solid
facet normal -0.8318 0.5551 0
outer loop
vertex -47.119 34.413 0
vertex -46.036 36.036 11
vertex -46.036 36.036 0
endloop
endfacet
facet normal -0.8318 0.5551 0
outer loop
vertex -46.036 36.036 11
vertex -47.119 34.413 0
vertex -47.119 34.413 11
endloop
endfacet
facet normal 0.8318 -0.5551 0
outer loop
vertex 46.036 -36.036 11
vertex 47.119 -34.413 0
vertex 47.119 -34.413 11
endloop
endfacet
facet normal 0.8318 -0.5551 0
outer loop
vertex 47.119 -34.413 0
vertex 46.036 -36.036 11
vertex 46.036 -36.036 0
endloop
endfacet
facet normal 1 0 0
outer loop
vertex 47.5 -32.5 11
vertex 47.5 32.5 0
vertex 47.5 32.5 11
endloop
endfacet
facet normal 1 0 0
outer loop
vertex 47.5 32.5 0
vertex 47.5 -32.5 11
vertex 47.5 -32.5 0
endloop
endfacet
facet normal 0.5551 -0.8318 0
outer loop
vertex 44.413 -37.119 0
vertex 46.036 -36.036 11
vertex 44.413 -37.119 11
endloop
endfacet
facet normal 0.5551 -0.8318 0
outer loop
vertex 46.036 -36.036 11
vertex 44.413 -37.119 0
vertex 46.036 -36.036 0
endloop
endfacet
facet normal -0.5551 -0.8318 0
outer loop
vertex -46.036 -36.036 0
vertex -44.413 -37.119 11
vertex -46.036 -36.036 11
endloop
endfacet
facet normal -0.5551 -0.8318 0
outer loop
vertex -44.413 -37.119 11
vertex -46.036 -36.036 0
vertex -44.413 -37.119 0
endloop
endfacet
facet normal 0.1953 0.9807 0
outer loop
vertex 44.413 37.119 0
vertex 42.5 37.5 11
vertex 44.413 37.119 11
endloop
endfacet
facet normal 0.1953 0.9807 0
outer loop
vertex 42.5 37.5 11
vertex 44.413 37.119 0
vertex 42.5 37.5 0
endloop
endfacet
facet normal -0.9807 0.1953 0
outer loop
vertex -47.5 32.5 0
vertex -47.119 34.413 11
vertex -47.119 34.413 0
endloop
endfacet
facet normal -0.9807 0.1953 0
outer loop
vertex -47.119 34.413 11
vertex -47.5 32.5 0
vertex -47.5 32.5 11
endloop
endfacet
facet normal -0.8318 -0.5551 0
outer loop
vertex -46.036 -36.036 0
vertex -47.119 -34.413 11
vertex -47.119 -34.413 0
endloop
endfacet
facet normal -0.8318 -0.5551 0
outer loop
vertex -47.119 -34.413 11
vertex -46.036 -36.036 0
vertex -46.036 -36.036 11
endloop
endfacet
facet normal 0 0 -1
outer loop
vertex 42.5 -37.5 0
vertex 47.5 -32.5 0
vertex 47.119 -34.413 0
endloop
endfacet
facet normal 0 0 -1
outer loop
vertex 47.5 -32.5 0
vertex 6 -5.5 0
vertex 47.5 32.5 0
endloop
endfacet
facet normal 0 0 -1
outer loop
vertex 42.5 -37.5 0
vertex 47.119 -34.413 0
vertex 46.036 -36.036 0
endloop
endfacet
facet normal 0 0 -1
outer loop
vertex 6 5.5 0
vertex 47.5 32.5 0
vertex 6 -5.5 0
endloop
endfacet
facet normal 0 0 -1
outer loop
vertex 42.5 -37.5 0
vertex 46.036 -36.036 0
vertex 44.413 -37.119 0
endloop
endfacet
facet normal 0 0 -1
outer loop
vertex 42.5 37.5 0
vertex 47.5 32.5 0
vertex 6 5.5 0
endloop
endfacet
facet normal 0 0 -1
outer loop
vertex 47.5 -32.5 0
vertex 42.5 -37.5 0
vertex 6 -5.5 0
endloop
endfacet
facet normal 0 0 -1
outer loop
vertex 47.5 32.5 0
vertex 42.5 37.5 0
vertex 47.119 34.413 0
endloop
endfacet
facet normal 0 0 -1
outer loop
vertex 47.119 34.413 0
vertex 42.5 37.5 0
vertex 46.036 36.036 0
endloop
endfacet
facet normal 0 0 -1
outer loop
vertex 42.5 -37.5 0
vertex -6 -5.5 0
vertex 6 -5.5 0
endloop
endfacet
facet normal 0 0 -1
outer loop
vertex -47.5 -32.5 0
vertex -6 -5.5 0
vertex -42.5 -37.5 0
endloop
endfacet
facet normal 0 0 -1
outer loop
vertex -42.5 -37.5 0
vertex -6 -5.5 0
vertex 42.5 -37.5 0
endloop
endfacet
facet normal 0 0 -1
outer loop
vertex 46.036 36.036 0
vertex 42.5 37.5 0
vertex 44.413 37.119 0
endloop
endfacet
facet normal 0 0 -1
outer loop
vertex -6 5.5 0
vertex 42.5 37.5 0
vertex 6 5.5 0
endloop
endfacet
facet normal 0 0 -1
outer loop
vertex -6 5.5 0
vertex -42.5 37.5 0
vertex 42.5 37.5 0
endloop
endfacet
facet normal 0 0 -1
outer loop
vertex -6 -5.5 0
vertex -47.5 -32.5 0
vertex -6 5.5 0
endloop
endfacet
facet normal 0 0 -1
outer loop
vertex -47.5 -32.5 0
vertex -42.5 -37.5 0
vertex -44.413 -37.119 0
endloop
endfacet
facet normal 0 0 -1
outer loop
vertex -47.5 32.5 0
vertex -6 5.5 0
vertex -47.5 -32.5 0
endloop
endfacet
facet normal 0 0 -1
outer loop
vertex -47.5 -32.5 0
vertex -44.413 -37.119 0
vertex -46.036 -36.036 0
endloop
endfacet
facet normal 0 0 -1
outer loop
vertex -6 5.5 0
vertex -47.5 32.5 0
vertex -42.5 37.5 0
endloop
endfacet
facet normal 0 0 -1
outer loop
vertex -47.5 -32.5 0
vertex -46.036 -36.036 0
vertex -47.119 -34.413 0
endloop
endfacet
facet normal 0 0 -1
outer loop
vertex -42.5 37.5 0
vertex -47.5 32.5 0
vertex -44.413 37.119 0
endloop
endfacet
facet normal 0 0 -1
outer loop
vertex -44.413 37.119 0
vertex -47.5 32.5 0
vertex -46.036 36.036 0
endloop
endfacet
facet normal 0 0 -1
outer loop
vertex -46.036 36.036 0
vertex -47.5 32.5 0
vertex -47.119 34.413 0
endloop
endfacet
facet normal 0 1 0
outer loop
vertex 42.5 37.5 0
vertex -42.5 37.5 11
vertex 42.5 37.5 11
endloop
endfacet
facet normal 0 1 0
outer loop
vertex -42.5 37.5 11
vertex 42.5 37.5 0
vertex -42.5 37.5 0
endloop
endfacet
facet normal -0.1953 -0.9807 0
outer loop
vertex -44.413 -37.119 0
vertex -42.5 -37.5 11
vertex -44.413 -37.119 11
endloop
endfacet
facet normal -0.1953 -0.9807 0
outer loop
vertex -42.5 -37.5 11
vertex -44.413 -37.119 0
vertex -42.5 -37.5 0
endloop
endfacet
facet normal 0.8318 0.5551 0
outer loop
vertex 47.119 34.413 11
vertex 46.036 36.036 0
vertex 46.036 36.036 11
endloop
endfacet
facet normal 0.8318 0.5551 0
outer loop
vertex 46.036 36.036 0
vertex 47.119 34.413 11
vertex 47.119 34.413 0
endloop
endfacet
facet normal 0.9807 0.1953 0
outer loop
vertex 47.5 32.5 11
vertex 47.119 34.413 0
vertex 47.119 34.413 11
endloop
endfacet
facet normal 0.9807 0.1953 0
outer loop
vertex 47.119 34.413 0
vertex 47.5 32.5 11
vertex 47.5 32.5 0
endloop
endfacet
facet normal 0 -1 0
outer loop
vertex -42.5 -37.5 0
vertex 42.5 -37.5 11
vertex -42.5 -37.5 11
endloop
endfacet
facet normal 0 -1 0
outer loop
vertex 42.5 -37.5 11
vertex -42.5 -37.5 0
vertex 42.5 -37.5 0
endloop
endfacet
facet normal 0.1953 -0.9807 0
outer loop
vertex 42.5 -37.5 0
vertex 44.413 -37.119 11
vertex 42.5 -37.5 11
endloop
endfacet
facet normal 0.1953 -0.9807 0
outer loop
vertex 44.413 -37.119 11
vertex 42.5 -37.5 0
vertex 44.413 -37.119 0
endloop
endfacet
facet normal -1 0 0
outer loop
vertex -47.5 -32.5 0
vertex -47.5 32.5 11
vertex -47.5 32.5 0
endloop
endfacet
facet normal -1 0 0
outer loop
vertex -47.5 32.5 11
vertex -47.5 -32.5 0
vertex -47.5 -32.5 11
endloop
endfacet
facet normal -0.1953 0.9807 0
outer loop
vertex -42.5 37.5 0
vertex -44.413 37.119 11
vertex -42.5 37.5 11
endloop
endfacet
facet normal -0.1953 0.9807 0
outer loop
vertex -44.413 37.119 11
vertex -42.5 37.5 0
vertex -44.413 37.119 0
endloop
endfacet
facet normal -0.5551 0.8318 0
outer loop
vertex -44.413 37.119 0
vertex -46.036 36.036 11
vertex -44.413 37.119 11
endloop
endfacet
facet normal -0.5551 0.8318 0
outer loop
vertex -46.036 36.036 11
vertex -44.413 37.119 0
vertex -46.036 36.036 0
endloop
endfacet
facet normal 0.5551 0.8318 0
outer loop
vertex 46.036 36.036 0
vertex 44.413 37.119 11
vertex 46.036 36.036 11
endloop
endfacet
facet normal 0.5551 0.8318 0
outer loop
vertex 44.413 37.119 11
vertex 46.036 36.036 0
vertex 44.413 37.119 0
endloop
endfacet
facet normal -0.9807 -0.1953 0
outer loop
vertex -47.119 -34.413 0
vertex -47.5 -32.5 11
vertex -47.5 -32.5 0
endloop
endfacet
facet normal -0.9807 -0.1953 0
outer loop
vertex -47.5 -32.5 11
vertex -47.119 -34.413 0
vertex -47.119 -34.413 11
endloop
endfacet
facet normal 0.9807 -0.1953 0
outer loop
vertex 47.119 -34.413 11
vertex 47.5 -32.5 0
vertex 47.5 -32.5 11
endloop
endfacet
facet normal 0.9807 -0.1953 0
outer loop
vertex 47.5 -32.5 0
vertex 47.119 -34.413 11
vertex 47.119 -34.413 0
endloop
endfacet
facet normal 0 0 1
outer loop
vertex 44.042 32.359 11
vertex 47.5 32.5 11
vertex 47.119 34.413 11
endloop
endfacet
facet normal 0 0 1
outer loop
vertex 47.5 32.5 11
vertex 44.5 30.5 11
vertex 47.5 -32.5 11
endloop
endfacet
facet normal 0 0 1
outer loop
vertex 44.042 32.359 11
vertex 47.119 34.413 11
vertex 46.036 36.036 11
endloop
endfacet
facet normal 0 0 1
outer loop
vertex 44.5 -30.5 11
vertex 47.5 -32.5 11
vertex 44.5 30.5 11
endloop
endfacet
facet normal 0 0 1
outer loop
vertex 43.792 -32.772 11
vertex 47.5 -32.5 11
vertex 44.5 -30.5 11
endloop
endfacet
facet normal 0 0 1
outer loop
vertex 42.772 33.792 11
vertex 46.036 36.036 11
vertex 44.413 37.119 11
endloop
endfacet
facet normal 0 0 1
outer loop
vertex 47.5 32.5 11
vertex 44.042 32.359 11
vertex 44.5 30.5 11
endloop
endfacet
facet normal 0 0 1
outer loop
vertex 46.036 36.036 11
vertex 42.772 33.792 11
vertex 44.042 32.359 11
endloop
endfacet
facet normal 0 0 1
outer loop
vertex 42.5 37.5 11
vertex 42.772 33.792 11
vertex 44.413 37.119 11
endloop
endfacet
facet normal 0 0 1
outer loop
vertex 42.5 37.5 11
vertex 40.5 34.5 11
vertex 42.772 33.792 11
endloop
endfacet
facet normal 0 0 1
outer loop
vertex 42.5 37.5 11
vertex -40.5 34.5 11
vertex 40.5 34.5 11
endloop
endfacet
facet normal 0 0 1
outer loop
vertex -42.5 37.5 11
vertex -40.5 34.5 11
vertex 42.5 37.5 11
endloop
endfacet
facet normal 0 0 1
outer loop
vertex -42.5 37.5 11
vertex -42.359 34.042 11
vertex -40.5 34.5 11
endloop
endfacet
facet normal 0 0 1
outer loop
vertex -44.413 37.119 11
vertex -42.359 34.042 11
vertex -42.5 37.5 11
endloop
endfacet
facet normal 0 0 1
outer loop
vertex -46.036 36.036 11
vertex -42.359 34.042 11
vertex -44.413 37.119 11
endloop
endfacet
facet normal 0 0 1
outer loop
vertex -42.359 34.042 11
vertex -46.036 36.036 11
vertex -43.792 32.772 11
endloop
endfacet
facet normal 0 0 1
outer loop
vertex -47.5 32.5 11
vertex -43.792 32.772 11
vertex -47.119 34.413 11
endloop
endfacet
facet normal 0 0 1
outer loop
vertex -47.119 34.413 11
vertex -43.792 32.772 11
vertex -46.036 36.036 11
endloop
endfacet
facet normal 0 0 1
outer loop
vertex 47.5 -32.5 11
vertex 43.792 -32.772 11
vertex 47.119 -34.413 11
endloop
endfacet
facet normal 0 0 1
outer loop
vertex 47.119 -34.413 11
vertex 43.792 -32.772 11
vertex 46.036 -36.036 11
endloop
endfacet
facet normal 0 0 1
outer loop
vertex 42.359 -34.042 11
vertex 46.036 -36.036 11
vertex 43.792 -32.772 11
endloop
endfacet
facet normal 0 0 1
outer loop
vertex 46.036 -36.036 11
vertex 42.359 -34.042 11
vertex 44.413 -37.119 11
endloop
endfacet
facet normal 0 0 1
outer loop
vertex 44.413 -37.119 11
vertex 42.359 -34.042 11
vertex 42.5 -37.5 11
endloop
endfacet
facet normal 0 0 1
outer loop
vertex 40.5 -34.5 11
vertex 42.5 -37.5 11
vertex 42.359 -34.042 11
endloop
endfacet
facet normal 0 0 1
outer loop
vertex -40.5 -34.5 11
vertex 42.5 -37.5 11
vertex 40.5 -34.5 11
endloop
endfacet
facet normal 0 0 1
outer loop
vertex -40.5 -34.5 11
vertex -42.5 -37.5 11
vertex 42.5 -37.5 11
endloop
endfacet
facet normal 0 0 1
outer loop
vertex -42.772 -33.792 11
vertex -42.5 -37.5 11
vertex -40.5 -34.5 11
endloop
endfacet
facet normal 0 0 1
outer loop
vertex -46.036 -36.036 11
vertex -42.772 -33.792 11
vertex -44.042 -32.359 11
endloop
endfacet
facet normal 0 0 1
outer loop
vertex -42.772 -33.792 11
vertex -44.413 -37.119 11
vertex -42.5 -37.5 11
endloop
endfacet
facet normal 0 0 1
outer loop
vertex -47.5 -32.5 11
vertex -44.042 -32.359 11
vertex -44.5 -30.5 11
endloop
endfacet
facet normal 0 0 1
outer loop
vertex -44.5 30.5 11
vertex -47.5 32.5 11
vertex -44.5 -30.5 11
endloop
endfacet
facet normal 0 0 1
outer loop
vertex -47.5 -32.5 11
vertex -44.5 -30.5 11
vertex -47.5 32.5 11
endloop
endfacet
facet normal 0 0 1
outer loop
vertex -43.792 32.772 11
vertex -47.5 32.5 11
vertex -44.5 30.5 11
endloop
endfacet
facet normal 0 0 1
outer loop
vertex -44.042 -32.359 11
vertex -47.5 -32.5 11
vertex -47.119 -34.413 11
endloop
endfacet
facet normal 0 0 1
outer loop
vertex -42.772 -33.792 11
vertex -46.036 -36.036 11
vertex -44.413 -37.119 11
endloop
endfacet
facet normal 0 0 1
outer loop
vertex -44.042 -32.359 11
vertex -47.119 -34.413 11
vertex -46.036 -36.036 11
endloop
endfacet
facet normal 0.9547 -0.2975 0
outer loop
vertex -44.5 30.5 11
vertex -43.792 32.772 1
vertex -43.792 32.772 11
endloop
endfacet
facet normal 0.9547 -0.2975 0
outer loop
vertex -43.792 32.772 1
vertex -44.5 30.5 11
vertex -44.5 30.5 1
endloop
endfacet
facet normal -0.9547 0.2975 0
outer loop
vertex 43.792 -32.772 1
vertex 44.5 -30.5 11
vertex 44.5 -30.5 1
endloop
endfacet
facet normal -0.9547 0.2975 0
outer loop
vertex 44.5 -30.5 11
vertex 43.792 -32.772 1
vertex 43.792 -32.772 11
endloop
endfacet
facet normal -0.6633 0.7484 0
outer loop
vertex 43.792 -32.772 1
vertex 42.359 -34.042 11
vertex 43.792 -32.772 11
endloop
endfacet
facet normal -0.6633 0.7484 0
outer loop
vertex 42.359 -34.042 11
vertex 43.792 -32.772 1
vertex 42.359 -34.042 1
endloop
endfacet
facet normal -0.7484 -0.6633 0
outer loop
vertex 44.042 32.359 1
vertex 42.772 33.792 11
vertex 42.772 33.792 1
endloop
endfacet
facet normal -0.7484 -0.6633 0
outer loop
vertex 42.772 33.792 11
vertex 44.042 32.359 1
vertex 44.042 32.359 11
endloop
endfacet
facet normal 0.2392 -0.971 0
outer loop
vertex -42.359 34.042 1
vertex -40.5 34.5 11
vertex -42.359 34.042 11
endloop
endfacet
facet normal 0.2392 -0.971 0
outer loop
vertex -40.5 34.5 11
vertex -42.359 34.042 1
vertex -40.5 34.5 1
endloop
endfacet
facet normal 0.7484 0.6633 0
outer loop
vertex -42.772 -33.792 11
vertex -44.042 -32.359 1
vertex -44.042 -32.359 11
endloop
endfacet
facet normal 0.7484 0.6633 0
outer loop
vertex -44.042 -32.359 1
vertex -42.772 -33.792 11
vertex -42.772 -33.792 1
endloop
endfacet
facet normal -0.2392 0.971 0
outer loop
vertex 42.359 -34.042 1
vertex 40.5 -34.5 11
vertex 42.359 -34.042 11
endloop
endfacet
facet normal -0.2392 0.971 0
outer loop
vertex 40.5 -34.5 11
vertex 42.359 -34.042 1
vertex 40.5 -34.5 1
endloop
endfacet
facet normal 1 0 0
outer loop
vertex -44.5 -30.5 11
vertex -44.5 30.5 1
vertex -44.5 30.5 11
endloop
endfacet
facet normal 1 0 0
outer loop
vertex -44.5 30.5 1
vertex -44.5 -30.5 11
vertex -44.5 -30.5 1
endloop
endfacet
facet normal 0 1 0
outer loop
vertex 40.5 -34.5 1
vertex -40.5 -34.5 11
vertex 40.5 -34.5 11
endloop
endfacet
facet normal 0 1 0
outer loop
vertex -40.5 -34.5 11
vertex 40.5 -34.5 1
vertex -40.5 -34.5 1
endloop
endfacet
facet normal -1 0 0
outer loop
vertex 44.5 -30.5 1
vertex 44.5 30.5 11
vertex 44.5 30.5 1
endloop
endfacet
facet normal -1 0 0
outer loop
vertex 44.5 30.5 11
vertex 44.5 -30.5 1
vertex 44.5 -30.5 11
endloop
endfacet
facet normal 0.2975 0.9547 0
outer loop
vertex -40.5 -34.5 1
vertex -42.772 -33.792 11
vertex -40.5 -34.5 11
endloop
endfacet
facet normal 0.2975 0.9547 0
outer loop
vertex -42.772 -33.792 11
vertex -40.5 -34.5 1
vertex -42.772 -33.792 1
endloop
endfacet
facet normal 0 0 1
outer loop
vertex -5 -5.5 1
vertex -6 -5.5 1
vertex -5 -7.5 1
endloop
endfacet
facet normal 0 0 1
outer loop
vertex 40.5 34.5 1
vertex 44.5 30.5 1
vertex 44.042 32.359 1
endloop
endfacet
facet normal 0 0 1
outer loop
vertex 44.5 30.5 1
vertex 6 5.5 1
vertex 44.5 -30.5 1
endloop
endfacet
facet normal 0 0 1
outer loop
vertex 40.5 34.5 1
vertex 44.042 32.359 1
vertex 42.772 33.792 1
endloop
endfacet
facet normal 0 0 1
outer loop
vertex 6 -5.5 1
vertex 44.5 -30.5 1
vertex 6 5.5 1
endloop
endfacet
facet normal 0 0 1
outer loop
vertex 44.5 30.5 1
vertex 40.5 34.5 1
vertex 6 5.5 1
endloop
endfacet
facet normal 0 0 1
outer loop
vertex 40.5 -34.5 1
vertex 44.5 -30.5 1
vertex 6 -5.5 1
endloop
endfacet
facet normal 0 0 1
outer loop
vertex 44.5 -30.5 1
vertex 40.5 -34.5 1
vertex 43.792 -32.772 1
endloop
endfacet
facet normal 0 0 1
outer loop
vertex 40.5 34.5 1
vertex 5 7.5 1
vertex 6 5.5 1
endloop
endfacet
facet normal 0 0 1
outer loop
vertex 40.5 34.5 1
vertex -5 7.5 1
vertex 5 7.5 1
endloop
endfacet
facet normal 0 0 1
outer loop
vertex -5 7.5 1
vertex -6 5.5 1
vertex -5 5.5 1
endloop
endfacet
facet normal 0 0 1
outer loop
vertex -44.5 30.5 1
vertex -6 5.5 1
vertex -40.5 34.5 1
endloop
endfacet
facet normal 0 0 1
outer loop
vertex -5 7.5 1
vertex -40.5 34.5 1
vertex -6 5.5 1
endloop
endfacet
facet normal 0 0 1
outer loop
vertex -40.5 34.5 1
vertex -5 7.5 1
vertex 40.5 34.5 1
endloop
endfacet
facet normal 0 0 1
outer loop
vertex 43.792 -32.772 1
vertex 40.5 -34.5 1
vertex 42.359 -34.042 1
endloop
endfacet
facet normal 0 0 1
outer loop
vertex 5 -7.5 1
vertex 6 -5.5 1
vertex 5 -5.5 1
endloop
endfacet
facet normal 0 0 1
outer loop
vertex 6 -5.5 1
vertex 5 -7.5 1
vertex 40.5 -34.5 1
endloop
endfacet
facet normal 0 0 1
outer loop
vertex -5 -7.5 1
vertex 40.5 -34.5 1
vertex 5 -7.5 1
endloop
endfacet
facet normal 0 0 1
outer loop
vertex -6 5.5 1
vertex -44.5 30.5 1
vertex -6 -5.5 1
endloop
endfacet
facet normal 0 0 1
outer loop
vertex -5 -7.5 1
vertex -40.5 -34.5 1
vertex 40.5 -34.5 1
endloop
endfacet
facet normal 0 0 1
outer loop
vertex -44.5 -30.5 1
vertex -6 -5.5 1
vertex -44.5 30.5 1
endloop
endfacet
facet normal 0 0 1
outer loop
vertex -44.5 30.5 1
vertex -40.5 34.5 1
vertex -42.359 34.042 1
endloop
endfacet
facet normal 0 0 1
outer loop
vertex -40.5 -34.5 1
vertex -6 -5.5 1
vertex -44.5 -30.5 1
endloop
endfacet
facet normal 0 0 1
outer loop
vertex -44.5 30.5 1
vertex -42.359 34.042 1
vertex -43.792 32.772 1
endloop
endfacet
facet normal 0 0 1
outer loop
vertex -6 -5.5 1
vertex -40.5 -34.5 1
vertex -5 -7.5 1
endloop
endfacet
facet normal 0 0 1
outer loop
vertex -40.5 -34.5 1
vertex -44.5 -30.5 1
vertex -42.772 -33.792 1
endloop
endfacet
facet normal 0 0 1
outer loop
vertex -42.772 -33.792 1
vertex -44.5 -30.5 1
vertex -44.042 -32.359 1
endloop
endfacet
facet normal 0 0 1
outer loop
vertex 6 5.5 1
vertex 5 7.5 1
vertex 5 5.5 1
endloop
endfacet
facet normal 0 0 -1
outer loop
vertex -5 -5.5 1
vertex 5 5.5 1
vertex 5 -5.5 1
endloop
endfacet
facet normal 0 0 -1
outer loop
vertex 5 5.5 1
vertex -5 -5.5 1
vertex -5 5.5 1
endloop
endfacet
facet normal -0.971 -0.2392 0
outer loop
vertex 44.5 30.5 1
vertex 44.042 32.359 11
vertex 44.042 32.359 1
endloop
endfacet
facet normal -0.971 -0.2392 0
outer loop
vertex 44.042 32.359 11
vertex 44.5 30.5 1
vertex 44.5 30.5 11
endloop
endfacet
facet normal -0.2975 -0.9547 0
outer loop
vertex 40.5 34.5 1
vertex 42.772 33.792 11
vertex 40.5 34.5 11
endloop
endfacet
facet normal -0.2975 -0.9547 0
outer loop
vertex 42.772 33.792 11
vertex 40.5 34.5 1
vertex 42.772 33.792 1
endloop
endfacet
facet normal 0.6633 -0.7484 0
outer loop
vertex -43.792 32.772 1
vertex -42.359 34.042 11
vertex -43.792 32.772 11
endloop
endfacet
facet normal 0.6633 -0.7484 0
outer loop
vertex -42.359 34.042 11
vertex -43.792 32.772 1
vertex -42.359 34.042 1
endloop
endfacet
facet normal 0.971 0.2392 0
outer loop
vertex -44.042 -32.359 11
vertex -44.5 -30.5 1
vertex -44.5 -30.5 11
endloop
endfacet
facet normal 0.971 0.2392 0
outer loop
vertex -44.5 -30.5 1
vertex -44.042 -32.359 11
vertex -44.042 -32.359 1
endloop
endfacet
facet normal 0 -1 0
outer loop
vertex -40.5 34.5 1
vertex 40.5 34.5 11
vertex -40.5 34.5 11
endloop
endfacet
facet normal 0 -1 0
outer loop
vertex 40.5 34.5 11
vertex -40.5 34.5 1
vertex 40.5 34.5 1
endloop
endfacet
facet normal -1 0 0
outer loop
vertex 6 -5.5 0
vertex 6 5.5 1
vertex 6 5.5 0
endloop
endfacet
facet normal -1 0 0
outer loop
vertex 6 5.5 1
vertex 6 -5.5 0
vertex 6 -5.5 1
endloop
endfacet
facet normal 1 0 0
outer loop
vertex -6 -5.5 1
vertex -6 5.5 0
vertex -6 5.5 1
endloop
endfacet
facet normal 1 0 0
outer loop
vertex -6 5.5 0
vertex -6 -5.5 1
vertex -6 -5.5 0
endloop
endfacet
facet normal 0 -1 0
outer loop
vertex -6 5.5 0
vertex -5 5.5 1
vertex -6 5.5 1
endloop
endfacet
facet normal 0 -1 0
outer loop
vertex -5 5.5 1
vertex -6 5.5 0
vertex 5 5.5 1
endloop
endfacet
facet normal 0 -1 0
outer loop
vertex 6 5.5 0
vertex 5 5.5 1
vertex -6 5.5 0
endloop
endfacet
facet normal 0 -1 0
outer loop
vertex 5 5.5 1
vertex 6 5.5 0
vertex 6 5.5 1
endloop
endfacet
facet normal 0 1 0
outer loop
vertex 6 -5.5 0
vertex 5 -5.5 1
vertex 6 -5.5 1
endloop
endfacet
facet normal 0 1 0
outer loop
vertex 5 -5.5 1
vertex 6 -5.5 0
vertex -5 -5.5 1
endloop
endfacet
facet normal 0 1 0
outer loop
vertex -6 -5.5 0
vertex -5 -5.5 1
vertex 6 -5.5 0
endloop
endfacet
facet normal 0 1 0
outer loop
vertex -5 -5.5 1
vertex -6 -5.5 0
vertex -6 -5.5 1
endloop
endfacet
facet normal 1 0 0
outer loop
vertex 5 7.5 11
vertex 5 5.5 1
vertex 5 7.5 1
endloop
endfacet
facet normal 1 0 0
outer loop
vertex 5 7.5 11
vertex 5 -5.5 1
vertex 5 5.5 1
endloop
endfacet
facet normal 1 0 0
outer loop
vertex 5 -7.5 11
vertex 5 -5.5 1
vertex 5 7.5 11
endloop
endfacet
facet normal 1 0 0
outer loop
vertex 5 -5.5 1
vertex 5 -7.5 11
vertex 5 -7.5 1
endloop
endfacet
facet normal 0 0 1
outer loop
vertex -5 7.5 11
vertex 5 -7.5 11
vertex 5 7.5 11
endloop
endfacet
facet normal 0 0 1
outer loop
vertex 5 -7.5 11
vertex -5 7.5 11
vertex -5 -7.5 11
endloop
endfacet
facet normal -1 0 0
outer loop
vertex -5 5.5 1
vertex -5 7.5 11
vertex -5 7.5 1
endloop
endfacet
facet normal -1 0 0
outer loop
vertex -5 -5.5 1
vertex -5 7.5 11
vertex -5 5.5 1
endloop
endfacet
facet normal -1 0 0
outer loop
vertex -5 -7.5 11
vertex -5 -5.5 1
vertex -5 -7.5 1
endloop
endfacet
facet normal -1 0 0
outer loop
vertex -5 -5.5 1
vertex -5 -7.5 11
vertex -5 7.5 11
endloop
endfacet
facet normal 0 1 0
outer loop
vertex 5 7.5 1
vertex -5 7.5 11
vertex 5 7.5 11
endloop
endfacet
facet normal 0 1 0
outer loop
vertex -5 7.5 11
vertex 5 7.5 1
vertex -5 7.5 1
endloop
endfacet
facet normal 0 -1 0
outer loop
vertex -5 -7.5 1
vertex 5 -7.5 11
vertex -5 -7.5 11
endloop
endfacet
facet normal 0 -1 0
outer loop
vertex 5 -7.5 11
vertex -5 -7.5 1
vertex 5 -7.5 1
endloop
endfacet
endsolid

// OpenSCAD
// // general params
// space_between_rands = 120;

// // rand
// rand_thickness = 5;
// rand_height = 50;
// rand_length = 250;

// // platform params (platform parameters)
// platform_width = space_between_rands + (2*rand_thickness);
// platform_length = rand_length;
// platform_inner_height = 10;
// shell_thickness = 2; // Thickness of the indent/border
// ground_of_shell_thickness = 2;
// platform_height = platform_inner_height + ground_of_shell_thickness;

// // cirkel voor glas
// circle_radius = 50;
// circle_indent = 1;
// circle_height = 5;
// circle_position_x = 60;
// circle_position_y = 190;


// // rand links (left border)
// color("red"){
//     cube([rand_thickness, rand_length, rand_height]);
// }

// // rand rechts (right border)
// color("red"){
// translate([platform_width - rand_thickness, 0, 0]) {
//         cube([rand_thickness, rand_length, rand_height]);
//     }
// }

// // platform with indent hole on top
// translate([0, 0, rand_height]) {
//     difference() {
//         cube([platform_width, platform_length, platform_height]);
//         translate([shell_thickness, shell_thickness, ground_of_shell_thickness]) {
//             difference(){
//                 cube([platform_width - 2*shell_thickness, platform_length - 2*shell_thickness, platform_height]);
//                 // position circle
//                 translate([circle_position_x, circle_position_y, ground_of_shell_thickness]){
//                     linear_extrude(1){
//                         circle(circle_radius, circle_indent);
//                     }
//                 }
//             }
//         }
//     }
// }



// Parameters for the rectangular frame
outer_length = 85; // Outer length of the frame (in mm)
outer_width = 65; // Outer width of the frame (in mm)
border_thickness = 2; // Thickness of the raised border (in mm)
border_height = 10; // Height of the raised border (in mm)
inner_length = outer_length - 2 * border_thickness; // Inner length of the frame (in mm)
inner_width = outer_width - 2 * border_thickness; // Inner width of the frame (in mm)
bottom_thickness = 1; // Thickness of the thin opaque bottom layer (in mm)
corner_radius = 5; // Radius for rounded corners (in mm)
slot_width = 10; // Width for headband slots (in mm)
slot_depth = 5;// Depth for headband slots (in mm)

// Function to create a rectangular frame with rounded corners, a hollow interior, and a thin opaque bottom layer
module frame() {
  difference() {
// Create the outer shell with rounded corners and raised border
    linear_extrude(height = border_height + bottom_thickness)
      offset(r = corner_radius)
        square([outer_length, outer_width], center = true);

// Create the inner hollow part with rounded corners
    translate([0, 0, bottom_thickness])
      linear_extrude(height = border_height + bottom_thickness + 10)
        offset(r = corner_radius - 1)
          square([inner_length, inner_width], center = true);

// Create the top cutout for the headband in the center of the narrow side
    // translate([outer_length/2 + border_thickness, 0, bottom_thickness + slot_depth/2])
    //   cube([10, border_height + 1, slot_depth], center = true);

// Cutout under the cube
    translate([0, 0, -1])
      cube([slot_width + 2 , border_height + 1, bottom_thickness + 10], center = true);
  }

// The cube
  translate([0, 0, bottom_thickness + 5])
    cube([slot_width, border_height + 5, 10], center = true);
}

// Create the frame using the module
frame();
